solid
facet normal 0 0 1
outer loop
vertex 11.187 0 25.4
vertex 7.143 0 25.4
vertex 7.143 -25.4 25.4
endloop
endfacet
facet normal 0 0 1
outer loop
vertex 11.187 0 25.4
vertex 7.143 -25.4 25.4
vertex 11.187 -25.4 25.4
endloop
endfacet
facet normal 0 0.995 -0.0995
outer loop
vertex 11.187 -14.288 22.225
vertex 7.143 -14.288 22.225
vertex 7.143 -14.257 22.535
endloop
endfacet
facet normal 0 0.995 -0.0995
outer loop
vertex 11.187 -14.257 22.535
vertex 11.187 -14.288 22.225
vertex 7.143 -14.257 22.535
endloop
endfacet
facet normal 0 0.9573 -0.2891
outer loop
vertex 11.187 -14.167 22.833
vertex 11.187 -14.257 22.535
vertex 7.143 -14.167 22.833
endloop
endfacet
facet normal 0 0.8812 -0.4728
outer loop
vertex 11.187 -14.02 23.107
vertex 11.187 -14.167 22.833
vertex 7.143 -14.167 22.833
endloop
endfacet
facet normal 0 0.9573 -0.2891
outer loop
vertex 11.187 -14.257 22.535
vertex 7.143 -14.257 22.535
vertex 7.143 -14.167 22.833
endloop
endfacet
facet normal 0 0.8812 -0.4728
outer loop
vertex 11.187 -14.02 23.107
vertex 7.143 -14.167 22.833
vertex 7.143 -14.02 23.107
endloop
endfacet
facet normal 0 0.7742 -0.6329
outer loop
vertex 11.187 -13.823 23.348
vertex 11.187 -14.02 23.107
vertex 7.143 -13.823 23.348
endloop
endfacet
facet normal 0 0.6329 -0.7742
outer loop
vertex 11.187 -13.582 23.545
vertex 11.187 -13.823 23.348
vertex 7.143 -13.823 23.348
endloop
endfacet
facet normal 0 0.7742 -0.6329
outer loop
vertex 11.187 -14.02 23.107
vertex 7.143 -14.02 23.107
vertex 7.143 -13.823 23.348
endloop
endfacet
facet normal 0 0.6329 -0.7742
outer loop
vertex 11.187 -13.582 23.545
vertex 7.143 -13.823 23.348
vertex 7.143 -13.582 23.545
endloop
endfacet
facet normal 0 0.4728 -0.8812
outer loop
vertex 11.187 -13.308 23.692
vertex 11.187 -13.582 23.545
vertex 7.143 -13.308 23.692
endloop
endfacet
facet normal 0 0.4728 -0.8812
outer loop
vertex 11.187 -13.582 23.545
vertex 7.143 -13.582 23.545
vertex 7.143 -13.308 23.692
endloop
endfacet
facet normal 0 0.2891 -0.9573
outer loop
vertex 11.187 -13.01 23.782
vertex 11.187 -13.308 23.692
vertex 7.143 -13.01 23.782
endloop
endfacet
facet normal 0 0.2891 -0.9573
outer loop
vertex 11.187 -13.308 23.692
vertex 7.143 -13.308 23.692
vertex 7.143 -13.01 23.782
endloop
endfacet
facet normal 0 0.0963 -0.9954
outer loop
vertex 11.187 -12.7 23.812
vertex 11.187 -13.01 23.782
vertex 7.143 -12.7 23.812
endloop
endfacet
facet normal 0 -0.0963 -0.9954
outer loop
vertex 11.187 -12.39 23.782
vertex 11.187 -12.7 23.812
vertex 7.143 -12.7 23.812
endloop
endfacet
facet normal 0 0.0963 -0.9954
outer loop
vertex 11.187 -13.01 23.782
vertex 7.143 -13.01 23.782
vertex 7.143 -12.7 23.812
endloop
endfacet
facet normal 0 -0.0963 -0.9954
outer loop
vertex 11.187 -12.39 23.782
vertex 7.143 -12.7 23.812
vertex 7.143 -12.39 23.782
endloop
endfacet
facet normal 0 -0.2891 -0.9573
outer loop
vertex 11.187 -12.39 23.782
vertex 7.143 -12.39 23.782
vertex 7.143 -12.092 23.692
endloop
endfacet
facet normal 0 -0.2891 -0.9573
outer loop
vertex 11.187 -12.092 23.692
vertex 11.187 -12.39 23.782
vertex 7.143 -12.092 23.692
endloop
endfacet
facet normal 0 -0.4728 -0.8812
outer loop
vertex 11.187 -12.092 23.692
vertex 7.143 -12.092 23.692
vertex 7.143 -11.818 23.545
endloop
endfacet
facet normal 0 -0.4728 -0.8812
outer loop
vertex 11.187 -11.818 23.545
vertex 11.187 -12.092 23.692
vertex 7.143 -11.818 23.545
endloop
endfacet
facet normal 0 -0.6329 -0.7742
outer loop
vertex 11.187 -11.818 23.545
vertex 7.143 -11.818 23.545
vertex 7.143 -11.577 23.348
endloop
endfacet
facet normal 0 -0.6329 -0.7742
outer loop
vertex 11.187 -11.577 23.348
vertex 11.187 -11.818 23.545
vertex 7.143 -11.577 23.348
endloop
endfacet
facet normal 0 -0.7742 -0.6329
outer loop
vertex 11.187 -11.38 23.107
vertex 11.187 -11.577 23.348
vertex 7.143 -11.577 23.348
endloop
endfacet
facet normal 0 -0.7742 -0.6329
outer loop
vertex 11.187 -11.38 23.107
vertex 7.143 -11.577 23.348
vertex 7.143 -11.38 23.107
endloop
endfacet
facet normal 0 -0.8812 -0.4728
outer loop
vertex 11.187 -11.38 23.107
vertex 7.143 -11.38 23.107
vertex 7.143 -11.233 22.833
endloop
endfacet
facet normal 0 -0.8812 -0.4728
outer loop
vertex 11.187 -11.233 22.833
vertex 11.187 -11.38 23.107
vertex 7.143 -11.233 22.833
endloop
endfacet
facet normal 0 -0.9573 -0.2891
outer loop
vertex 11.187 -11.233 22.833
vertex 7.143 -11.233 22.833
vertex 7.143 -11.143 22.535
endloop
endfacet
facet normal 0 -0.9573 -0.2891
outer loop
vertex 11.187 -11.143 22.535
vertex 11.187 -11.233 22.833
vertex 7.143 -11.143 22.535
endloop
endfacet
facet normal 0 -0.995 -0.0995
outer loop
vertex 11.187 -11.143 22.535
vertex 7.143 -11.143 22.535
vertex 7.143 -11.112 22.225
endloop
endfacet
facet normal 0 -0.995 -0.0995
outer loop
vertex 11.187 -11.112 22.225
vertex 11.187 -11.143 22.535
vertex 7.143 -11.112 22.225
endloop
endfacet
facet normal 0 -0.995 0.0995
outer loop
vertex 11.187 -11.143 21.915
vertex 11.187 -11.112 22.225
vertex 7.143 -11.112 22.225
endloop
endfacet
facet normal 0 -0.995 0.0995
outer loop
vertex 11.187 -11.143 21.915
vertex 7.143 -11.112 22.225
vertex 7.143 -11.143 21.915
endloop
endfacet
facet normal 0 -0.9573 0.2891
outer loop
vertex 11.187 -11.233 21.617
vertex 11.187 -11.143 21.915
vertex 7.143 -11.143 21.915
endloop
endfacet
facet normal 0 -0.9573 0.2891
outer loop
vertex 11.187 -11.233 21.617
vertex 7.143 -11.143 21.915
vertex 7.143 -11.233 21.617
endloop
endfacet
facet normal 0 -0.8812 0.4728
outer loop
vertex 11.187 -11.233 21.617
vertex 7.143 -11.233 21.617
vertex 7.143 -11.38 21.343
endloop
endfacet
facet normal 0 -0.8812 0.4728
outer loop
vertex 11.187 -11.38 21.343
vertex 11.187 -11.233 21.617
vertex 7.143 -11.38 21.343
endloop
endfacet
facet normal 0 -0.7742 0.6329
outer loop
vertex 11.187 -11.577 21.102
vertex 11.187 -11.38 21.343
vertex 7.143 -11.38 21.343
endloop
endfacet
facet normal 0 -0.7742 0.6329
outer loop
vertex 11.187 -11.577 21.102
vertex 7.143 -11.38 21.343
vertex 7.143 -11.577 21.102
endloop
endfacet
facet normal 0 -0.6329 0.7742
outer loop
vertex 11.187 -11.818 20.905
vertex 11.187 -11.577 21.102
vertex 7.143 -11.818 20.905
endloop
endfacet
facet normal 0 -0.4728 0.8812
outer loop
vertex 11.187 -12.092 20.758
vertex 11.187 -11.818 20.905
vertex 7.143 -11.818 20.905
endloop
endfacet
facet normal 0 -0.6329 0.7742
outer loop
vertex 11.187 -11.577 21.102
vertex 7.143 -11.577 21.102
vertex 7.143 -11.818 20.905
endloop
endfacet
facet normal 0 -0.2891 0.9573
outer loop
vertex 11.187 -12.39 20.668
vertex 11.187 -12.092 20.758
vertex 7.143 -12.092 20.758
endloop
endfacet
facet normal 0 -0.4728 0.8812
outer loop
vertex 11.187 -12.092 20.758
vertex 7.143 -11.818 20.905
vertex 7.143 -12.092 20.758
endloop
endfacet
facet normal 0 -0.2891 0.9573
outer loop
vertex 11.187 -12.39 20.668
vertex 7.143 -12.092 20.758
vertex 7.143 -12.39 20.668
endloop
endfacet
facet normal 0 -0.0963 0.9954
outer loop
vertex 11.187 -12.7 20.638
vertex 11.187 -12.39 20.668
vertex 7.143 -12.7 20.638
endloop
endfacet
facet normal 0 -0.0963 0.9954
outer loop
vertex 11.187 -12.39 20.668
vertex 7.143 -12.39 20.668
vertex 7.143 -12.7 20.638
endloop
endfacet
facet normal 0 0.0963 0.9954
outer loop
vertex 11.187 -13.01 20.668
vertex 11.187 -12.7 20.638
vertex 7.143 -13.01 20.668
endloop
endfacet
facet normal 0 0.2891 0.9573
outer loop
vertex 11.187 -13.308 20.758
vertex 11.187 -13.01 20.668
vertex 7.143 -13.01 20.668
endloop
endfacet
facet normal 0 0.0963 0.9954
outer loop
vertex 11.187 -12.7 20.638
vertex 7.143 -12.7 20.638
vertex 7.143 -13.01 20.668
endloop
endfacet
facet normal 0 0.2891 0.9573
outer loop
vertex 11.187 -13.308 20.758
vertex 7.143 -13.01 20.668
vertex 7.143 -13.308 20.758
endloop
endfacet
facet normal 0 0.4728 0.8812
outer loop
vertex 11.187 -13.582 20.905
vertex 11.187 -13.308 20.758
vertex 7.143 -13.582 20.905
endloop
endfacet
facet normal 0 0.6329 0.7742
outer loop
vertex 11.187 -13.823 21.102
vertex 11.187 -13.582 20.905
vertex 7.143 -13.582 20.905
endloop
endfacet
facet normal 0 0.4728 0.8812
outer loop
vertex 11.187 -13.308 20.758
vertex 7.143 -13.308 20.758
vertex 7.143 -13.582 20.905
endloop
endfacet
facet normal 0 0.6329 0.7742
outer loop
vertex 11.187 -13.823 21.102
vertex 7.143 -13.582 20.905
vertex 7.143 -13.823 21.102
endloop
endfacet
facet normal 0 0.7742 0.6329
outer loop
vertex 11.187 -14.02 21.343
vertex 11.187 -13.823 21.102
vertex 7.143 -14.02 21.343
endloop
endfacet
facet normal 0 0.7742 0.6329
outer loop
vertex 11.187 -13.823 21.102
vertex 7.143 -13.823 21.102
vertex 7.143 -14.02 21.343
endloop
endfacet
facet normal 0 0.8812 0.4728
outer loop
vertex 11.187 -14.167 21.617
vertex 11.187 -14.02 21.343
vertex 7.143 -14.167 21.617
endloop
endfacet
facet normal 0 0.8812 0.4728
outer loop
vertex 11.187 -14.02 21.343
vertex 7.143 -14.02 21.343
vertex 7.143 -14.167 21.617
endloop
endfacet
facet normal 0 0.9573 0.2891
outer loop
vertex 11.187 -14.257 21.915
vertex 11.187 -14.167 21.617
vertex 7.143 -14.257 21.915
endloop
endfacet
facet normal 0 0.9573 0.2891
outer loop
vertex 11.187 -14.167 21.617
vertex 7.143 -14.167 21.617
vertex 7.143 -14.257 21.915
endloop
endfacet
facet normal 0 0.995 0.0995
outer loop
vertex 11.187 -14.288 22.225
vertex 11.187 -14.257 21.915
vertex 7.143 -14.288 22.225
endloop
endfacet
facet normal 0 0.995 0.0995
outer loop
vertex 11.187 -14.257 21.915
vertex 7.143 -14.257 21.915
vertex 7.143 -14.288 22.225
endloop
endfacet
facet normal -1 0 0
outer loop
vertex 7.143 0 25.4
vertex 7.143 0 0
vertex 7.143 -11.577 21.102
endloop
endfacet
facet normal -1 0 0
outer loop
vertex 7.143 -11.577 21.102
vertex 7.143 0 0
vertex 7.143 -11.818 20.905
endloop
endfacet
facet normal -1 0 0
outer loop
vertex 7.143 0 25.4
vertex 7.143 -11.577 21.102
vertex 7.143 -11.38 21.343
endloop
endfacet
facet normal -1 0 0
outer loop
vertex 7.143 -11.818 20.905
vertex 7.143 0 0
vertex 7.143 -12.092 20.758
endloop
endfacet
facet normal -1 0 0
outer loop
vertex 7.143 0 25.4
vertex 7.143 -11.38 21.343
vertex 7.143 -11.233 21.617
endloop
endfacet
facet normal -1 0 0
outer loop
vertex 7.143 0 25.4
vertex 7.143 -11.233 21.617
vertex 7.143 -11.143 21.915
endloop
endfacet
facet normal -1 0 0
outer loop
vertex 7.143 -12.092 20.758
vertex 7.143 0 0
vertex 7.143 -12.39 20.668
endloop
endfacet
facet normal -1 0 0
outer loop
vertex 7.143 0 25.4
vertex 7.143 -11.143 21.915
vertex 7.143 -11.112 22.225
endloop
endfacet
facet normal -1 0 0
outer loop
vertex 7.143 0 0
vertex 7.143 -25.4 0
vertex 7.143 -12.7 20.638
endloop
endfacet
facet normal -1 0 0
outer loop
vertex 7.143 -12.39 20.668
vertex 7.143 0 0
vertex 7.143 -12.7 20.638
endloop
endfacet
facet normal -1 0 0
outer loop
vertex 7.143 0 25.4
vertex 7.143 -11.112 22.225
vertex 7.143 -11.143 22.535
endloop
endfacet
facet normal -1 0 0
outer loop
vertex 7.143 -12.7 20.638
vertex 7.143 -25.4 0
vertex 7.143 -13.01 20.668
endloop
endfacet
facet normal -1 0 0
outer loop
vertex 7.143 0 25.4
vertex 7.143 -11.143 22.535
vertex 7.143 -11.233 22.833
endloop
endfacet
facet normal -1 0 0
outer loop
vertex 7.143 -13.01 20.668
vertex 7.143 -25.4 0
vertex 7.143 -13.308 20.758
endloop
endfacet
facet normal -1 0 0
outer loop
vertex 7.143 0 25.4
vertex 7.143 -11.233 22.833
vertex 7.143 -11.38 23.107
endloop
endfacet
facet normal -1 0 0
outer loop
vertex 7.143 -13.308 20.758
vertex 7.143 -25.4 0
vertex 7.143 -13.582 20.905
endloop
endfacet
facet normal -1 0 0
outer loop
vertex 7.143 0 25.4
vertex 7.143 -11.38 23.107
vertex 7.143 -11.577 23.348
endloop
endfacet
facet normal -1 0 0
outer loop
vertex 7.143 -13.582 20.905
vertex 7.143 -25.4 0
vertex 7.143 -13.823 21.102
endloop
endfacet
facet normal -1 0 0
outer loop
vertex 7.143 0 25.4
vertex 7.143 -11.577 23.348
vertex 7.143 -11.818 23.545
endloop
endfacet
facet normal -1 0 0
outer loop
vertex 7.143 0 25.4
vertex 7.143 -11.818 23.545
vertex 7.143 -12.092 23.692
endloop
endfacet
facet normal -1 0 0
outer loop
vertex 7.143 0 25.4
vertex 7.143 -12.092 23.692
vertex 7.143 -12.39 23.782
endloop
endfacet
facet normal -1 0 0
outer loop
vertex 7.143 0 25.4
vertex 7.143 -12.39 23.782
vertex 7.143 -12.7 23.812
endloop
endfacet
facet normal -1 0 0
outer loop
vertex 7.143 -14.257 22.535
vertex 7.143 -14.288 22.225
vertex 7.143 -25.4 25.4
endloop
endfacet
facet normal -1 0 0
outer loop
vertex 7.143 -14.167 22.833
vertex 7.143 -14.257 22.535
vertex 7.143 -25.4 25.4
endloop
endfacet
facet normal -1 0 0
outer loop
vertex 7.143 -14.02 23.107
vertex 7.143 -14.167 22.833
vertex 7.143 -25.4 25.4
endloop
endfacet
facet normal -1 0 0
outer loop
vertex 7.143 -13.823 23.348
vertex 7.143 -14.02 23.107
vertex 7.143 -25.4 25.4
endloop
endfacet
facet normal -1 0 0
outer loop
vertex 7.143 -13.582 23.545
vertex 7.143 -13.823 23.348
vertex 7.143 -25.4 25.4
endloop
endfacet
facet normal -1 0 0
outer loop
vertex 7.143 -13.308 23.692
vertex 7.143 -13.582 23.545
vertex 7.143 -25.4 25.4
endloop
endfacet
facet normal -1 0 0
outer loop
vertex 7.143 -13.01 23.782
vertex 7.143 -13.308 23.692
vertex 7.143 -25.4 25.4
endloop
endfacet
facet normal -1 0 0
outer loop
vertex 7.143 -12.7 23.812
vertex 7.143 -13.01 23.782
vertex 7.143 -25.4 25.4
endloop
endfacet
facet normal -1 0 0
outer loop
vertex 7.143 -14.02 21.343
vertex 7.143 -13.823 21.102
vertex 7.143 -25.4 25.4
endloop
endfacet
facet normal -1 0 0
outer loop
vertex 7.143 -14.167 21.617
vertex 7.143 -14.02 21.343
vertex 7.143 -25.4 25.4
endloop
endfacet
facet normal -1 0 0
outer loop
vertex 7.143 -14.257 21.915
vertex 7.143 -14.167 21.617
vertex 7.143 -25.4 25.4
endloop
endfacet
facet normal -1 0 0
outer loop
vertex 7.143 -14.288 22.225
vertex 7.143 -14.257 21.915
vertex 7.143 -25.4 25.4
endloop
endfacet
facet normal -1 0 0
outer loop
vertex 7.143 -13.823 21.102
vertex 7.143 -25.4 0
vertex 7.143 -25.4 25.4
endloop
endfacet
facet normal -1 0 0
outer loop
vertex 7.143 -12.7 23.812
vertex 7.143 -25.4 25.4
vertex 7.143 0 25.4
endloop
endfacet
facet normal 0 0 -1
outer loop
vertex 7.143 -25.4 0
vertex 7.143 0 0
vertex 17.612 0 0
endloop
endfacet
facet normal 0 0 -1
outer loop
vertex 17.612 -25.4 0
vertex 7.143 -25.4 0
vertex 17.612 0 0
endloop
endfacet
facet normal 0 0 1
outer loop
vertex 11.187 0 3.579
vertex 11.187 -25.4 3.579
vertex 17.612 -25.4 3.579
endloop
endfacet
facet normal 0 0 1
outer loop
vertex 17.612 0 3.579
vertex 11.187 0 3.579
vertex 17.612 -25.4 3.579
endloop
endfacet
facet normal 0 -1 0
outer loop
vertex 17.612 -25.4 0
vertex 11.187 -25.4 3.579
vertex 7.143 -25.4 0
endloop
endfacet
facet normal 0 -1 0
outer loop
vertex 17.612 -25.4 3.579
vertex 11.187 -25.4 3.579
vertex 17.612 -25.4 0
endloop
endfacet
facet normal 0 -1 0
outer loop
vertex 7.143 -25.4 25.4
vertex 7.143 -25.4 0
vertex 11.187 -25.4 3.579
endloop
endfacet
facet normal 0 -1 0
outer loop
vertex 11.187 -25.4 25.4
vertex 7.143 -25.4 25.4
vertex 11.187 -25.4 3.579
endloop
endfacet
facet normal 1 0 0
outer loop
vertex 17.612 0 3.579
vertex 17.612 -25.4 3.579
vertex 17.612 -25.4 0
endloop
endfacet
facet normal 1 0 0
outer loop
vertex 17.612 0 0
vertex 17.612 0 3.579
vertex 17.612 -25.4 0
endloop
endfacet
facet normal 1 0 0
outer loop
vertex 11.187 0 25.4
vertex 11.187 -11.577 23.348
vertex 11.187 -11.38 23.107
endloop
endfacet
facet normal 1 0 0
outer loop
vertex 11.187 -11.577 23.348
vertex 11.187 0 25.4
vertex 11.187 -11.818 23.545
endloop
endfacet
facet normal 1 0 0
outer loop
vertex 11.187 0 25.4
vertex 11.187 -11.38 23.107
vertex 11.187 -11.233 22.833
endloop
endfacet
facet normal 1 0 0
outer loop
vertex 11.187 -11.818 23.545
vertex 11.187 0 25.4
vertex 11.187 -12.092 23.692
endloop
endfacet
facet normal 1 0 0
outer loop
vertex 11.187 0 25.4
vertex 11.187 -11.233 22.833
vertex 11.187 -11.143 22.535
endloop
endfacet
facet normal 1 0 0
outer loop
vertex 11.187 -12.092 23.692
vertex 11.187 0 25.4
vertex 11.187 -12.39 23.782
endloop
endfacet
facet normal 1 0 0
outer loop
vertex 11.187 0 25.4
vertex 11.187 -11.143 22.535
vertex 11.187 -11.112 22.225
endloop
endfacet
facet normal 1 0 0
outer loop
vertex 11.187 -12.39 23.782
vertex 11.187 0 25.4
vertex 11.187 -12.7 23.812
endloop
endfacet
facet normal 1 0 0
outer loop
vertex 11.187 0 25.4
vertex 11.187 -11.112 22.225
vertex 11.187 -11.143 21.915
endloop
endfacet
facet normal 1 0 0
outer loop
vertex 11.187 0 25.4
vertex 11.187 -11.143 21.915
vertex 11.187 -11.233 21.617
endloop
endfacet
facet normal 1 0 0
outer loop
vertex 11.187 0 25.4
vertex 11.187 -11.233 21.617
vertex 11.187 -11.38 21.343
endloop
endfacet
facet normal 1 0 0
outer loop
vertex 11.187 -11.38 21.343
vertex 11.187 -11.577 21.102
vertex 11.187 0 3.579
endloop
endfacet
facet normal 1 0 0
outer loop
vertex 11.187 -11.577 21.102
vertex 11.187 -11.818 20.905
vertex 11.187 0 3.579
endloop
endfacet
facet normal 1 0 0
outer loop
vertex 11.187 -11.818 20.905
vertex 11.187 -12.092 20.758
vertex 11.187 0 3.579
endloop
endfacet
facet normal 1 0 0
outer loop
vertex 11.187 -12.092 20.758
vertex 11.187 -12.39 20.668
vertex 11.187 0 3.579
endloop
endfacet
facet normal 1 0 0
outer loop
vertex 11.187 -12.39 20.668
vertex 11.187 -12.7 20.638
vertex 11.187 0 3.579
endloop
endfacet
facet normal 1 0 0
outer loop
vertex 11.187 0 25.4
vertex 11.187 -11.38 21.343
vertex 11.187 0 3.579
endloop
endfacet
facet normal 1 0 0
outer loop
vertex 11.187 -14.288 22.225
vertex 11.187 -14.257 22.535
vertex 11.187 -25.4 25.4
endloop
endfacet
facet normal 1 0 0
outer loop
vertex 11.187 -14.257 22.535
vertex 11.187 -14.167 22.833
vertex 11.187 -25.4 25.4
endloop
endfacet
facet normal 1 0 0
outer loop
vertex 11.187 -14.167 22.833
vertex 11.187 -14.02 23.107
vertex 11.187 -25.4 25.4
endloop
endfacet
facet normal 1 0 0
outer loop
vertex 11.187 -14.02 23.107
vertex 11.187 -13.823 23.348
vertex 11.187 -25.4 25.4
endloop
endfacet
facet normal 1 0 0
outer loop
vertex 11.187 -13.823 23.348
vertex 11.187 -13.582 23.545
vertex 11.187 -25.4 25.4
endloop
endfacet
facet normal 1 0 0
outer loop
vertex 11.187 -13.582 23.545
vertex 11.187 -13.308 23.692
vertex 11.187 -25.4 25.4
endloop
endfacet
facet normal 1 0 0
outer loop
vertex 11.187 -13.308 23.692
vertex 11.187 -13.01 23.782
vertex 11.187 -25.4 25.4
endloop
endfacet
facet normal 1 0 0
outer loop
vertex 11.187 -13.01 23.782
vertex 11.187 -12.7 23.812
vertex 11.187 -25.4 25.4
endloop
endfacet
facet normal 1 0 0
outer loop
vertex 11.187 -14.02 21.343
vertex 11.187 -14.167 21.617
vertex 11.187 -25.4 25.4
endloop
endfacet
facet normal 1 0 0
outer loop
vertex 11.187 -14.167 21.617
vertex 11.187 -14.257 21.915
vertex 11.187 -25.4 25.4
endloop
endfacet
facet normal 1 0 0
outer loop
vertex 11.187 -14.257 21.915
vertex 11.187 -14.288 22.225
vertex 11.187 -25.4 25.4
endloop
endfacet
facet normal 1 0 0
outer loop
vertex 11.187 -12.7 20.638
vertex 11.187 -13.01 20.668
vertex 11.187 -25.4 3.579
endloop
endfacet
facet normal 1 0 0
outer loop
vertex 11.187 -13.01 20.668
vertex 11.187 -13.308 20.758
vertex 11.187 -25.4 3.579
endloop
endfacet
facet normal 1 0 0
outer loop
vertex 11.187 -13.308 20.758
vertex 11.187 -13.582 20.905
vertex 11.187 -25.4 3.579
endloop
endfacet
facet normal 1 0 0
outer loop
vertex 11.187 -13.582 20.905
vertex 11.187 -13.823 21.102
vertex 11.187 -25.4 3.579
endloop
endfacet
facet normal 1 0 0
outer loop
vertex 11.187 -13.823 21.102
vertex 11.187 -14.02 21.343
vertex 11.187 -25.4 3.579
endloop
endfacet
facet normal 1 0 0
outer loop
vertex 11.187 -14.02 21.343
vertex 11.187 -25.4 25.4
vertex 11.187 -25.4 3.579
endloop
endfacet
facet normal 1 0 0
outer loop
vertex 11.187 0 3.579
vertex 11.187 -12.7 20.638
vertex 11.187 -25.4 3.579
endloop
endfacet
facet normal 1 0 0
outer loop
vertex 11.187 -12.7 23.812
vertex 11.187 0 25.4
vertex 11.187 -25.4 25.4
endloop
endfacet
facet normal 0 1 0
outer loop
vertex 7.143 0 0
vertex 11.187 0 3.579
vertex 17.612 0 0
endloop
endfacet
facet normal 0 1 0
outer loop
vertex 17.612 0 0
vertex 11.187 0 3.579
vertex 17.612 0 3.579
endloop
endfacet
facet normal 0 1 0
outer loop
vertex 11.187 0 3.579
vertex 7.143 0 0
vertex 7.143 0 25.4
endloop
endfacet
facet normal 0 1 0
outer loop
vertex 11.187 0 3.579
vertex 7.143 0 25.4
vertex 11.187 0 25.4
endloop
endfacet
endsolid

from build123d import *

# Parameters (mm, degrees)
F0_W     = 25.4
F0_H     = 25.4
F1_DEPTH = 25.4
F2_W     = 7.143348
F2_H     = 25.4
F3_DEPTH = 25.4
F4_R     = 1.5875
F5_DEPTH = 25.4


with BuildPart() as f1:
    # F0 (on Front) → F1 (new body)
    with BuildSketch(Plane.XZ):
        with Locations((12.7, 12.7)):
            Rectangle(F0_W, F0_H)
    extrude(amount=F1_DEPTH)

    # F2 (on face) → F3 (cut)
    with BuildSketch(Plane.XZ.offset(25.4)):
        with Locations((3.571674, 12.7)):
            Rectangle(F2_W, F2_H)
        Polygon((25.4, 25.4), (11.18654, 25.4), (11.18654, 3.579036), (17.612327, 3.579036), (17.612327, 0), (25.4, 0), align=None)
    extrude(amount=-F3_DEPTH, mode=Mode.SUBTRACT)

    # F4 (on face) → F5 (cut)
    with BuildSketch(Plane(origin=(7.143348, 0, 0), x_dir=(0, -1, 0), z_dir=(-1, 0, 0))):
        with Locations((12.7, 22.225)):
            Circle(F4_R)
    extrude(amount=-F5_DEPTH, mode=Mode.SUBTRACT)


solid = f1.part
